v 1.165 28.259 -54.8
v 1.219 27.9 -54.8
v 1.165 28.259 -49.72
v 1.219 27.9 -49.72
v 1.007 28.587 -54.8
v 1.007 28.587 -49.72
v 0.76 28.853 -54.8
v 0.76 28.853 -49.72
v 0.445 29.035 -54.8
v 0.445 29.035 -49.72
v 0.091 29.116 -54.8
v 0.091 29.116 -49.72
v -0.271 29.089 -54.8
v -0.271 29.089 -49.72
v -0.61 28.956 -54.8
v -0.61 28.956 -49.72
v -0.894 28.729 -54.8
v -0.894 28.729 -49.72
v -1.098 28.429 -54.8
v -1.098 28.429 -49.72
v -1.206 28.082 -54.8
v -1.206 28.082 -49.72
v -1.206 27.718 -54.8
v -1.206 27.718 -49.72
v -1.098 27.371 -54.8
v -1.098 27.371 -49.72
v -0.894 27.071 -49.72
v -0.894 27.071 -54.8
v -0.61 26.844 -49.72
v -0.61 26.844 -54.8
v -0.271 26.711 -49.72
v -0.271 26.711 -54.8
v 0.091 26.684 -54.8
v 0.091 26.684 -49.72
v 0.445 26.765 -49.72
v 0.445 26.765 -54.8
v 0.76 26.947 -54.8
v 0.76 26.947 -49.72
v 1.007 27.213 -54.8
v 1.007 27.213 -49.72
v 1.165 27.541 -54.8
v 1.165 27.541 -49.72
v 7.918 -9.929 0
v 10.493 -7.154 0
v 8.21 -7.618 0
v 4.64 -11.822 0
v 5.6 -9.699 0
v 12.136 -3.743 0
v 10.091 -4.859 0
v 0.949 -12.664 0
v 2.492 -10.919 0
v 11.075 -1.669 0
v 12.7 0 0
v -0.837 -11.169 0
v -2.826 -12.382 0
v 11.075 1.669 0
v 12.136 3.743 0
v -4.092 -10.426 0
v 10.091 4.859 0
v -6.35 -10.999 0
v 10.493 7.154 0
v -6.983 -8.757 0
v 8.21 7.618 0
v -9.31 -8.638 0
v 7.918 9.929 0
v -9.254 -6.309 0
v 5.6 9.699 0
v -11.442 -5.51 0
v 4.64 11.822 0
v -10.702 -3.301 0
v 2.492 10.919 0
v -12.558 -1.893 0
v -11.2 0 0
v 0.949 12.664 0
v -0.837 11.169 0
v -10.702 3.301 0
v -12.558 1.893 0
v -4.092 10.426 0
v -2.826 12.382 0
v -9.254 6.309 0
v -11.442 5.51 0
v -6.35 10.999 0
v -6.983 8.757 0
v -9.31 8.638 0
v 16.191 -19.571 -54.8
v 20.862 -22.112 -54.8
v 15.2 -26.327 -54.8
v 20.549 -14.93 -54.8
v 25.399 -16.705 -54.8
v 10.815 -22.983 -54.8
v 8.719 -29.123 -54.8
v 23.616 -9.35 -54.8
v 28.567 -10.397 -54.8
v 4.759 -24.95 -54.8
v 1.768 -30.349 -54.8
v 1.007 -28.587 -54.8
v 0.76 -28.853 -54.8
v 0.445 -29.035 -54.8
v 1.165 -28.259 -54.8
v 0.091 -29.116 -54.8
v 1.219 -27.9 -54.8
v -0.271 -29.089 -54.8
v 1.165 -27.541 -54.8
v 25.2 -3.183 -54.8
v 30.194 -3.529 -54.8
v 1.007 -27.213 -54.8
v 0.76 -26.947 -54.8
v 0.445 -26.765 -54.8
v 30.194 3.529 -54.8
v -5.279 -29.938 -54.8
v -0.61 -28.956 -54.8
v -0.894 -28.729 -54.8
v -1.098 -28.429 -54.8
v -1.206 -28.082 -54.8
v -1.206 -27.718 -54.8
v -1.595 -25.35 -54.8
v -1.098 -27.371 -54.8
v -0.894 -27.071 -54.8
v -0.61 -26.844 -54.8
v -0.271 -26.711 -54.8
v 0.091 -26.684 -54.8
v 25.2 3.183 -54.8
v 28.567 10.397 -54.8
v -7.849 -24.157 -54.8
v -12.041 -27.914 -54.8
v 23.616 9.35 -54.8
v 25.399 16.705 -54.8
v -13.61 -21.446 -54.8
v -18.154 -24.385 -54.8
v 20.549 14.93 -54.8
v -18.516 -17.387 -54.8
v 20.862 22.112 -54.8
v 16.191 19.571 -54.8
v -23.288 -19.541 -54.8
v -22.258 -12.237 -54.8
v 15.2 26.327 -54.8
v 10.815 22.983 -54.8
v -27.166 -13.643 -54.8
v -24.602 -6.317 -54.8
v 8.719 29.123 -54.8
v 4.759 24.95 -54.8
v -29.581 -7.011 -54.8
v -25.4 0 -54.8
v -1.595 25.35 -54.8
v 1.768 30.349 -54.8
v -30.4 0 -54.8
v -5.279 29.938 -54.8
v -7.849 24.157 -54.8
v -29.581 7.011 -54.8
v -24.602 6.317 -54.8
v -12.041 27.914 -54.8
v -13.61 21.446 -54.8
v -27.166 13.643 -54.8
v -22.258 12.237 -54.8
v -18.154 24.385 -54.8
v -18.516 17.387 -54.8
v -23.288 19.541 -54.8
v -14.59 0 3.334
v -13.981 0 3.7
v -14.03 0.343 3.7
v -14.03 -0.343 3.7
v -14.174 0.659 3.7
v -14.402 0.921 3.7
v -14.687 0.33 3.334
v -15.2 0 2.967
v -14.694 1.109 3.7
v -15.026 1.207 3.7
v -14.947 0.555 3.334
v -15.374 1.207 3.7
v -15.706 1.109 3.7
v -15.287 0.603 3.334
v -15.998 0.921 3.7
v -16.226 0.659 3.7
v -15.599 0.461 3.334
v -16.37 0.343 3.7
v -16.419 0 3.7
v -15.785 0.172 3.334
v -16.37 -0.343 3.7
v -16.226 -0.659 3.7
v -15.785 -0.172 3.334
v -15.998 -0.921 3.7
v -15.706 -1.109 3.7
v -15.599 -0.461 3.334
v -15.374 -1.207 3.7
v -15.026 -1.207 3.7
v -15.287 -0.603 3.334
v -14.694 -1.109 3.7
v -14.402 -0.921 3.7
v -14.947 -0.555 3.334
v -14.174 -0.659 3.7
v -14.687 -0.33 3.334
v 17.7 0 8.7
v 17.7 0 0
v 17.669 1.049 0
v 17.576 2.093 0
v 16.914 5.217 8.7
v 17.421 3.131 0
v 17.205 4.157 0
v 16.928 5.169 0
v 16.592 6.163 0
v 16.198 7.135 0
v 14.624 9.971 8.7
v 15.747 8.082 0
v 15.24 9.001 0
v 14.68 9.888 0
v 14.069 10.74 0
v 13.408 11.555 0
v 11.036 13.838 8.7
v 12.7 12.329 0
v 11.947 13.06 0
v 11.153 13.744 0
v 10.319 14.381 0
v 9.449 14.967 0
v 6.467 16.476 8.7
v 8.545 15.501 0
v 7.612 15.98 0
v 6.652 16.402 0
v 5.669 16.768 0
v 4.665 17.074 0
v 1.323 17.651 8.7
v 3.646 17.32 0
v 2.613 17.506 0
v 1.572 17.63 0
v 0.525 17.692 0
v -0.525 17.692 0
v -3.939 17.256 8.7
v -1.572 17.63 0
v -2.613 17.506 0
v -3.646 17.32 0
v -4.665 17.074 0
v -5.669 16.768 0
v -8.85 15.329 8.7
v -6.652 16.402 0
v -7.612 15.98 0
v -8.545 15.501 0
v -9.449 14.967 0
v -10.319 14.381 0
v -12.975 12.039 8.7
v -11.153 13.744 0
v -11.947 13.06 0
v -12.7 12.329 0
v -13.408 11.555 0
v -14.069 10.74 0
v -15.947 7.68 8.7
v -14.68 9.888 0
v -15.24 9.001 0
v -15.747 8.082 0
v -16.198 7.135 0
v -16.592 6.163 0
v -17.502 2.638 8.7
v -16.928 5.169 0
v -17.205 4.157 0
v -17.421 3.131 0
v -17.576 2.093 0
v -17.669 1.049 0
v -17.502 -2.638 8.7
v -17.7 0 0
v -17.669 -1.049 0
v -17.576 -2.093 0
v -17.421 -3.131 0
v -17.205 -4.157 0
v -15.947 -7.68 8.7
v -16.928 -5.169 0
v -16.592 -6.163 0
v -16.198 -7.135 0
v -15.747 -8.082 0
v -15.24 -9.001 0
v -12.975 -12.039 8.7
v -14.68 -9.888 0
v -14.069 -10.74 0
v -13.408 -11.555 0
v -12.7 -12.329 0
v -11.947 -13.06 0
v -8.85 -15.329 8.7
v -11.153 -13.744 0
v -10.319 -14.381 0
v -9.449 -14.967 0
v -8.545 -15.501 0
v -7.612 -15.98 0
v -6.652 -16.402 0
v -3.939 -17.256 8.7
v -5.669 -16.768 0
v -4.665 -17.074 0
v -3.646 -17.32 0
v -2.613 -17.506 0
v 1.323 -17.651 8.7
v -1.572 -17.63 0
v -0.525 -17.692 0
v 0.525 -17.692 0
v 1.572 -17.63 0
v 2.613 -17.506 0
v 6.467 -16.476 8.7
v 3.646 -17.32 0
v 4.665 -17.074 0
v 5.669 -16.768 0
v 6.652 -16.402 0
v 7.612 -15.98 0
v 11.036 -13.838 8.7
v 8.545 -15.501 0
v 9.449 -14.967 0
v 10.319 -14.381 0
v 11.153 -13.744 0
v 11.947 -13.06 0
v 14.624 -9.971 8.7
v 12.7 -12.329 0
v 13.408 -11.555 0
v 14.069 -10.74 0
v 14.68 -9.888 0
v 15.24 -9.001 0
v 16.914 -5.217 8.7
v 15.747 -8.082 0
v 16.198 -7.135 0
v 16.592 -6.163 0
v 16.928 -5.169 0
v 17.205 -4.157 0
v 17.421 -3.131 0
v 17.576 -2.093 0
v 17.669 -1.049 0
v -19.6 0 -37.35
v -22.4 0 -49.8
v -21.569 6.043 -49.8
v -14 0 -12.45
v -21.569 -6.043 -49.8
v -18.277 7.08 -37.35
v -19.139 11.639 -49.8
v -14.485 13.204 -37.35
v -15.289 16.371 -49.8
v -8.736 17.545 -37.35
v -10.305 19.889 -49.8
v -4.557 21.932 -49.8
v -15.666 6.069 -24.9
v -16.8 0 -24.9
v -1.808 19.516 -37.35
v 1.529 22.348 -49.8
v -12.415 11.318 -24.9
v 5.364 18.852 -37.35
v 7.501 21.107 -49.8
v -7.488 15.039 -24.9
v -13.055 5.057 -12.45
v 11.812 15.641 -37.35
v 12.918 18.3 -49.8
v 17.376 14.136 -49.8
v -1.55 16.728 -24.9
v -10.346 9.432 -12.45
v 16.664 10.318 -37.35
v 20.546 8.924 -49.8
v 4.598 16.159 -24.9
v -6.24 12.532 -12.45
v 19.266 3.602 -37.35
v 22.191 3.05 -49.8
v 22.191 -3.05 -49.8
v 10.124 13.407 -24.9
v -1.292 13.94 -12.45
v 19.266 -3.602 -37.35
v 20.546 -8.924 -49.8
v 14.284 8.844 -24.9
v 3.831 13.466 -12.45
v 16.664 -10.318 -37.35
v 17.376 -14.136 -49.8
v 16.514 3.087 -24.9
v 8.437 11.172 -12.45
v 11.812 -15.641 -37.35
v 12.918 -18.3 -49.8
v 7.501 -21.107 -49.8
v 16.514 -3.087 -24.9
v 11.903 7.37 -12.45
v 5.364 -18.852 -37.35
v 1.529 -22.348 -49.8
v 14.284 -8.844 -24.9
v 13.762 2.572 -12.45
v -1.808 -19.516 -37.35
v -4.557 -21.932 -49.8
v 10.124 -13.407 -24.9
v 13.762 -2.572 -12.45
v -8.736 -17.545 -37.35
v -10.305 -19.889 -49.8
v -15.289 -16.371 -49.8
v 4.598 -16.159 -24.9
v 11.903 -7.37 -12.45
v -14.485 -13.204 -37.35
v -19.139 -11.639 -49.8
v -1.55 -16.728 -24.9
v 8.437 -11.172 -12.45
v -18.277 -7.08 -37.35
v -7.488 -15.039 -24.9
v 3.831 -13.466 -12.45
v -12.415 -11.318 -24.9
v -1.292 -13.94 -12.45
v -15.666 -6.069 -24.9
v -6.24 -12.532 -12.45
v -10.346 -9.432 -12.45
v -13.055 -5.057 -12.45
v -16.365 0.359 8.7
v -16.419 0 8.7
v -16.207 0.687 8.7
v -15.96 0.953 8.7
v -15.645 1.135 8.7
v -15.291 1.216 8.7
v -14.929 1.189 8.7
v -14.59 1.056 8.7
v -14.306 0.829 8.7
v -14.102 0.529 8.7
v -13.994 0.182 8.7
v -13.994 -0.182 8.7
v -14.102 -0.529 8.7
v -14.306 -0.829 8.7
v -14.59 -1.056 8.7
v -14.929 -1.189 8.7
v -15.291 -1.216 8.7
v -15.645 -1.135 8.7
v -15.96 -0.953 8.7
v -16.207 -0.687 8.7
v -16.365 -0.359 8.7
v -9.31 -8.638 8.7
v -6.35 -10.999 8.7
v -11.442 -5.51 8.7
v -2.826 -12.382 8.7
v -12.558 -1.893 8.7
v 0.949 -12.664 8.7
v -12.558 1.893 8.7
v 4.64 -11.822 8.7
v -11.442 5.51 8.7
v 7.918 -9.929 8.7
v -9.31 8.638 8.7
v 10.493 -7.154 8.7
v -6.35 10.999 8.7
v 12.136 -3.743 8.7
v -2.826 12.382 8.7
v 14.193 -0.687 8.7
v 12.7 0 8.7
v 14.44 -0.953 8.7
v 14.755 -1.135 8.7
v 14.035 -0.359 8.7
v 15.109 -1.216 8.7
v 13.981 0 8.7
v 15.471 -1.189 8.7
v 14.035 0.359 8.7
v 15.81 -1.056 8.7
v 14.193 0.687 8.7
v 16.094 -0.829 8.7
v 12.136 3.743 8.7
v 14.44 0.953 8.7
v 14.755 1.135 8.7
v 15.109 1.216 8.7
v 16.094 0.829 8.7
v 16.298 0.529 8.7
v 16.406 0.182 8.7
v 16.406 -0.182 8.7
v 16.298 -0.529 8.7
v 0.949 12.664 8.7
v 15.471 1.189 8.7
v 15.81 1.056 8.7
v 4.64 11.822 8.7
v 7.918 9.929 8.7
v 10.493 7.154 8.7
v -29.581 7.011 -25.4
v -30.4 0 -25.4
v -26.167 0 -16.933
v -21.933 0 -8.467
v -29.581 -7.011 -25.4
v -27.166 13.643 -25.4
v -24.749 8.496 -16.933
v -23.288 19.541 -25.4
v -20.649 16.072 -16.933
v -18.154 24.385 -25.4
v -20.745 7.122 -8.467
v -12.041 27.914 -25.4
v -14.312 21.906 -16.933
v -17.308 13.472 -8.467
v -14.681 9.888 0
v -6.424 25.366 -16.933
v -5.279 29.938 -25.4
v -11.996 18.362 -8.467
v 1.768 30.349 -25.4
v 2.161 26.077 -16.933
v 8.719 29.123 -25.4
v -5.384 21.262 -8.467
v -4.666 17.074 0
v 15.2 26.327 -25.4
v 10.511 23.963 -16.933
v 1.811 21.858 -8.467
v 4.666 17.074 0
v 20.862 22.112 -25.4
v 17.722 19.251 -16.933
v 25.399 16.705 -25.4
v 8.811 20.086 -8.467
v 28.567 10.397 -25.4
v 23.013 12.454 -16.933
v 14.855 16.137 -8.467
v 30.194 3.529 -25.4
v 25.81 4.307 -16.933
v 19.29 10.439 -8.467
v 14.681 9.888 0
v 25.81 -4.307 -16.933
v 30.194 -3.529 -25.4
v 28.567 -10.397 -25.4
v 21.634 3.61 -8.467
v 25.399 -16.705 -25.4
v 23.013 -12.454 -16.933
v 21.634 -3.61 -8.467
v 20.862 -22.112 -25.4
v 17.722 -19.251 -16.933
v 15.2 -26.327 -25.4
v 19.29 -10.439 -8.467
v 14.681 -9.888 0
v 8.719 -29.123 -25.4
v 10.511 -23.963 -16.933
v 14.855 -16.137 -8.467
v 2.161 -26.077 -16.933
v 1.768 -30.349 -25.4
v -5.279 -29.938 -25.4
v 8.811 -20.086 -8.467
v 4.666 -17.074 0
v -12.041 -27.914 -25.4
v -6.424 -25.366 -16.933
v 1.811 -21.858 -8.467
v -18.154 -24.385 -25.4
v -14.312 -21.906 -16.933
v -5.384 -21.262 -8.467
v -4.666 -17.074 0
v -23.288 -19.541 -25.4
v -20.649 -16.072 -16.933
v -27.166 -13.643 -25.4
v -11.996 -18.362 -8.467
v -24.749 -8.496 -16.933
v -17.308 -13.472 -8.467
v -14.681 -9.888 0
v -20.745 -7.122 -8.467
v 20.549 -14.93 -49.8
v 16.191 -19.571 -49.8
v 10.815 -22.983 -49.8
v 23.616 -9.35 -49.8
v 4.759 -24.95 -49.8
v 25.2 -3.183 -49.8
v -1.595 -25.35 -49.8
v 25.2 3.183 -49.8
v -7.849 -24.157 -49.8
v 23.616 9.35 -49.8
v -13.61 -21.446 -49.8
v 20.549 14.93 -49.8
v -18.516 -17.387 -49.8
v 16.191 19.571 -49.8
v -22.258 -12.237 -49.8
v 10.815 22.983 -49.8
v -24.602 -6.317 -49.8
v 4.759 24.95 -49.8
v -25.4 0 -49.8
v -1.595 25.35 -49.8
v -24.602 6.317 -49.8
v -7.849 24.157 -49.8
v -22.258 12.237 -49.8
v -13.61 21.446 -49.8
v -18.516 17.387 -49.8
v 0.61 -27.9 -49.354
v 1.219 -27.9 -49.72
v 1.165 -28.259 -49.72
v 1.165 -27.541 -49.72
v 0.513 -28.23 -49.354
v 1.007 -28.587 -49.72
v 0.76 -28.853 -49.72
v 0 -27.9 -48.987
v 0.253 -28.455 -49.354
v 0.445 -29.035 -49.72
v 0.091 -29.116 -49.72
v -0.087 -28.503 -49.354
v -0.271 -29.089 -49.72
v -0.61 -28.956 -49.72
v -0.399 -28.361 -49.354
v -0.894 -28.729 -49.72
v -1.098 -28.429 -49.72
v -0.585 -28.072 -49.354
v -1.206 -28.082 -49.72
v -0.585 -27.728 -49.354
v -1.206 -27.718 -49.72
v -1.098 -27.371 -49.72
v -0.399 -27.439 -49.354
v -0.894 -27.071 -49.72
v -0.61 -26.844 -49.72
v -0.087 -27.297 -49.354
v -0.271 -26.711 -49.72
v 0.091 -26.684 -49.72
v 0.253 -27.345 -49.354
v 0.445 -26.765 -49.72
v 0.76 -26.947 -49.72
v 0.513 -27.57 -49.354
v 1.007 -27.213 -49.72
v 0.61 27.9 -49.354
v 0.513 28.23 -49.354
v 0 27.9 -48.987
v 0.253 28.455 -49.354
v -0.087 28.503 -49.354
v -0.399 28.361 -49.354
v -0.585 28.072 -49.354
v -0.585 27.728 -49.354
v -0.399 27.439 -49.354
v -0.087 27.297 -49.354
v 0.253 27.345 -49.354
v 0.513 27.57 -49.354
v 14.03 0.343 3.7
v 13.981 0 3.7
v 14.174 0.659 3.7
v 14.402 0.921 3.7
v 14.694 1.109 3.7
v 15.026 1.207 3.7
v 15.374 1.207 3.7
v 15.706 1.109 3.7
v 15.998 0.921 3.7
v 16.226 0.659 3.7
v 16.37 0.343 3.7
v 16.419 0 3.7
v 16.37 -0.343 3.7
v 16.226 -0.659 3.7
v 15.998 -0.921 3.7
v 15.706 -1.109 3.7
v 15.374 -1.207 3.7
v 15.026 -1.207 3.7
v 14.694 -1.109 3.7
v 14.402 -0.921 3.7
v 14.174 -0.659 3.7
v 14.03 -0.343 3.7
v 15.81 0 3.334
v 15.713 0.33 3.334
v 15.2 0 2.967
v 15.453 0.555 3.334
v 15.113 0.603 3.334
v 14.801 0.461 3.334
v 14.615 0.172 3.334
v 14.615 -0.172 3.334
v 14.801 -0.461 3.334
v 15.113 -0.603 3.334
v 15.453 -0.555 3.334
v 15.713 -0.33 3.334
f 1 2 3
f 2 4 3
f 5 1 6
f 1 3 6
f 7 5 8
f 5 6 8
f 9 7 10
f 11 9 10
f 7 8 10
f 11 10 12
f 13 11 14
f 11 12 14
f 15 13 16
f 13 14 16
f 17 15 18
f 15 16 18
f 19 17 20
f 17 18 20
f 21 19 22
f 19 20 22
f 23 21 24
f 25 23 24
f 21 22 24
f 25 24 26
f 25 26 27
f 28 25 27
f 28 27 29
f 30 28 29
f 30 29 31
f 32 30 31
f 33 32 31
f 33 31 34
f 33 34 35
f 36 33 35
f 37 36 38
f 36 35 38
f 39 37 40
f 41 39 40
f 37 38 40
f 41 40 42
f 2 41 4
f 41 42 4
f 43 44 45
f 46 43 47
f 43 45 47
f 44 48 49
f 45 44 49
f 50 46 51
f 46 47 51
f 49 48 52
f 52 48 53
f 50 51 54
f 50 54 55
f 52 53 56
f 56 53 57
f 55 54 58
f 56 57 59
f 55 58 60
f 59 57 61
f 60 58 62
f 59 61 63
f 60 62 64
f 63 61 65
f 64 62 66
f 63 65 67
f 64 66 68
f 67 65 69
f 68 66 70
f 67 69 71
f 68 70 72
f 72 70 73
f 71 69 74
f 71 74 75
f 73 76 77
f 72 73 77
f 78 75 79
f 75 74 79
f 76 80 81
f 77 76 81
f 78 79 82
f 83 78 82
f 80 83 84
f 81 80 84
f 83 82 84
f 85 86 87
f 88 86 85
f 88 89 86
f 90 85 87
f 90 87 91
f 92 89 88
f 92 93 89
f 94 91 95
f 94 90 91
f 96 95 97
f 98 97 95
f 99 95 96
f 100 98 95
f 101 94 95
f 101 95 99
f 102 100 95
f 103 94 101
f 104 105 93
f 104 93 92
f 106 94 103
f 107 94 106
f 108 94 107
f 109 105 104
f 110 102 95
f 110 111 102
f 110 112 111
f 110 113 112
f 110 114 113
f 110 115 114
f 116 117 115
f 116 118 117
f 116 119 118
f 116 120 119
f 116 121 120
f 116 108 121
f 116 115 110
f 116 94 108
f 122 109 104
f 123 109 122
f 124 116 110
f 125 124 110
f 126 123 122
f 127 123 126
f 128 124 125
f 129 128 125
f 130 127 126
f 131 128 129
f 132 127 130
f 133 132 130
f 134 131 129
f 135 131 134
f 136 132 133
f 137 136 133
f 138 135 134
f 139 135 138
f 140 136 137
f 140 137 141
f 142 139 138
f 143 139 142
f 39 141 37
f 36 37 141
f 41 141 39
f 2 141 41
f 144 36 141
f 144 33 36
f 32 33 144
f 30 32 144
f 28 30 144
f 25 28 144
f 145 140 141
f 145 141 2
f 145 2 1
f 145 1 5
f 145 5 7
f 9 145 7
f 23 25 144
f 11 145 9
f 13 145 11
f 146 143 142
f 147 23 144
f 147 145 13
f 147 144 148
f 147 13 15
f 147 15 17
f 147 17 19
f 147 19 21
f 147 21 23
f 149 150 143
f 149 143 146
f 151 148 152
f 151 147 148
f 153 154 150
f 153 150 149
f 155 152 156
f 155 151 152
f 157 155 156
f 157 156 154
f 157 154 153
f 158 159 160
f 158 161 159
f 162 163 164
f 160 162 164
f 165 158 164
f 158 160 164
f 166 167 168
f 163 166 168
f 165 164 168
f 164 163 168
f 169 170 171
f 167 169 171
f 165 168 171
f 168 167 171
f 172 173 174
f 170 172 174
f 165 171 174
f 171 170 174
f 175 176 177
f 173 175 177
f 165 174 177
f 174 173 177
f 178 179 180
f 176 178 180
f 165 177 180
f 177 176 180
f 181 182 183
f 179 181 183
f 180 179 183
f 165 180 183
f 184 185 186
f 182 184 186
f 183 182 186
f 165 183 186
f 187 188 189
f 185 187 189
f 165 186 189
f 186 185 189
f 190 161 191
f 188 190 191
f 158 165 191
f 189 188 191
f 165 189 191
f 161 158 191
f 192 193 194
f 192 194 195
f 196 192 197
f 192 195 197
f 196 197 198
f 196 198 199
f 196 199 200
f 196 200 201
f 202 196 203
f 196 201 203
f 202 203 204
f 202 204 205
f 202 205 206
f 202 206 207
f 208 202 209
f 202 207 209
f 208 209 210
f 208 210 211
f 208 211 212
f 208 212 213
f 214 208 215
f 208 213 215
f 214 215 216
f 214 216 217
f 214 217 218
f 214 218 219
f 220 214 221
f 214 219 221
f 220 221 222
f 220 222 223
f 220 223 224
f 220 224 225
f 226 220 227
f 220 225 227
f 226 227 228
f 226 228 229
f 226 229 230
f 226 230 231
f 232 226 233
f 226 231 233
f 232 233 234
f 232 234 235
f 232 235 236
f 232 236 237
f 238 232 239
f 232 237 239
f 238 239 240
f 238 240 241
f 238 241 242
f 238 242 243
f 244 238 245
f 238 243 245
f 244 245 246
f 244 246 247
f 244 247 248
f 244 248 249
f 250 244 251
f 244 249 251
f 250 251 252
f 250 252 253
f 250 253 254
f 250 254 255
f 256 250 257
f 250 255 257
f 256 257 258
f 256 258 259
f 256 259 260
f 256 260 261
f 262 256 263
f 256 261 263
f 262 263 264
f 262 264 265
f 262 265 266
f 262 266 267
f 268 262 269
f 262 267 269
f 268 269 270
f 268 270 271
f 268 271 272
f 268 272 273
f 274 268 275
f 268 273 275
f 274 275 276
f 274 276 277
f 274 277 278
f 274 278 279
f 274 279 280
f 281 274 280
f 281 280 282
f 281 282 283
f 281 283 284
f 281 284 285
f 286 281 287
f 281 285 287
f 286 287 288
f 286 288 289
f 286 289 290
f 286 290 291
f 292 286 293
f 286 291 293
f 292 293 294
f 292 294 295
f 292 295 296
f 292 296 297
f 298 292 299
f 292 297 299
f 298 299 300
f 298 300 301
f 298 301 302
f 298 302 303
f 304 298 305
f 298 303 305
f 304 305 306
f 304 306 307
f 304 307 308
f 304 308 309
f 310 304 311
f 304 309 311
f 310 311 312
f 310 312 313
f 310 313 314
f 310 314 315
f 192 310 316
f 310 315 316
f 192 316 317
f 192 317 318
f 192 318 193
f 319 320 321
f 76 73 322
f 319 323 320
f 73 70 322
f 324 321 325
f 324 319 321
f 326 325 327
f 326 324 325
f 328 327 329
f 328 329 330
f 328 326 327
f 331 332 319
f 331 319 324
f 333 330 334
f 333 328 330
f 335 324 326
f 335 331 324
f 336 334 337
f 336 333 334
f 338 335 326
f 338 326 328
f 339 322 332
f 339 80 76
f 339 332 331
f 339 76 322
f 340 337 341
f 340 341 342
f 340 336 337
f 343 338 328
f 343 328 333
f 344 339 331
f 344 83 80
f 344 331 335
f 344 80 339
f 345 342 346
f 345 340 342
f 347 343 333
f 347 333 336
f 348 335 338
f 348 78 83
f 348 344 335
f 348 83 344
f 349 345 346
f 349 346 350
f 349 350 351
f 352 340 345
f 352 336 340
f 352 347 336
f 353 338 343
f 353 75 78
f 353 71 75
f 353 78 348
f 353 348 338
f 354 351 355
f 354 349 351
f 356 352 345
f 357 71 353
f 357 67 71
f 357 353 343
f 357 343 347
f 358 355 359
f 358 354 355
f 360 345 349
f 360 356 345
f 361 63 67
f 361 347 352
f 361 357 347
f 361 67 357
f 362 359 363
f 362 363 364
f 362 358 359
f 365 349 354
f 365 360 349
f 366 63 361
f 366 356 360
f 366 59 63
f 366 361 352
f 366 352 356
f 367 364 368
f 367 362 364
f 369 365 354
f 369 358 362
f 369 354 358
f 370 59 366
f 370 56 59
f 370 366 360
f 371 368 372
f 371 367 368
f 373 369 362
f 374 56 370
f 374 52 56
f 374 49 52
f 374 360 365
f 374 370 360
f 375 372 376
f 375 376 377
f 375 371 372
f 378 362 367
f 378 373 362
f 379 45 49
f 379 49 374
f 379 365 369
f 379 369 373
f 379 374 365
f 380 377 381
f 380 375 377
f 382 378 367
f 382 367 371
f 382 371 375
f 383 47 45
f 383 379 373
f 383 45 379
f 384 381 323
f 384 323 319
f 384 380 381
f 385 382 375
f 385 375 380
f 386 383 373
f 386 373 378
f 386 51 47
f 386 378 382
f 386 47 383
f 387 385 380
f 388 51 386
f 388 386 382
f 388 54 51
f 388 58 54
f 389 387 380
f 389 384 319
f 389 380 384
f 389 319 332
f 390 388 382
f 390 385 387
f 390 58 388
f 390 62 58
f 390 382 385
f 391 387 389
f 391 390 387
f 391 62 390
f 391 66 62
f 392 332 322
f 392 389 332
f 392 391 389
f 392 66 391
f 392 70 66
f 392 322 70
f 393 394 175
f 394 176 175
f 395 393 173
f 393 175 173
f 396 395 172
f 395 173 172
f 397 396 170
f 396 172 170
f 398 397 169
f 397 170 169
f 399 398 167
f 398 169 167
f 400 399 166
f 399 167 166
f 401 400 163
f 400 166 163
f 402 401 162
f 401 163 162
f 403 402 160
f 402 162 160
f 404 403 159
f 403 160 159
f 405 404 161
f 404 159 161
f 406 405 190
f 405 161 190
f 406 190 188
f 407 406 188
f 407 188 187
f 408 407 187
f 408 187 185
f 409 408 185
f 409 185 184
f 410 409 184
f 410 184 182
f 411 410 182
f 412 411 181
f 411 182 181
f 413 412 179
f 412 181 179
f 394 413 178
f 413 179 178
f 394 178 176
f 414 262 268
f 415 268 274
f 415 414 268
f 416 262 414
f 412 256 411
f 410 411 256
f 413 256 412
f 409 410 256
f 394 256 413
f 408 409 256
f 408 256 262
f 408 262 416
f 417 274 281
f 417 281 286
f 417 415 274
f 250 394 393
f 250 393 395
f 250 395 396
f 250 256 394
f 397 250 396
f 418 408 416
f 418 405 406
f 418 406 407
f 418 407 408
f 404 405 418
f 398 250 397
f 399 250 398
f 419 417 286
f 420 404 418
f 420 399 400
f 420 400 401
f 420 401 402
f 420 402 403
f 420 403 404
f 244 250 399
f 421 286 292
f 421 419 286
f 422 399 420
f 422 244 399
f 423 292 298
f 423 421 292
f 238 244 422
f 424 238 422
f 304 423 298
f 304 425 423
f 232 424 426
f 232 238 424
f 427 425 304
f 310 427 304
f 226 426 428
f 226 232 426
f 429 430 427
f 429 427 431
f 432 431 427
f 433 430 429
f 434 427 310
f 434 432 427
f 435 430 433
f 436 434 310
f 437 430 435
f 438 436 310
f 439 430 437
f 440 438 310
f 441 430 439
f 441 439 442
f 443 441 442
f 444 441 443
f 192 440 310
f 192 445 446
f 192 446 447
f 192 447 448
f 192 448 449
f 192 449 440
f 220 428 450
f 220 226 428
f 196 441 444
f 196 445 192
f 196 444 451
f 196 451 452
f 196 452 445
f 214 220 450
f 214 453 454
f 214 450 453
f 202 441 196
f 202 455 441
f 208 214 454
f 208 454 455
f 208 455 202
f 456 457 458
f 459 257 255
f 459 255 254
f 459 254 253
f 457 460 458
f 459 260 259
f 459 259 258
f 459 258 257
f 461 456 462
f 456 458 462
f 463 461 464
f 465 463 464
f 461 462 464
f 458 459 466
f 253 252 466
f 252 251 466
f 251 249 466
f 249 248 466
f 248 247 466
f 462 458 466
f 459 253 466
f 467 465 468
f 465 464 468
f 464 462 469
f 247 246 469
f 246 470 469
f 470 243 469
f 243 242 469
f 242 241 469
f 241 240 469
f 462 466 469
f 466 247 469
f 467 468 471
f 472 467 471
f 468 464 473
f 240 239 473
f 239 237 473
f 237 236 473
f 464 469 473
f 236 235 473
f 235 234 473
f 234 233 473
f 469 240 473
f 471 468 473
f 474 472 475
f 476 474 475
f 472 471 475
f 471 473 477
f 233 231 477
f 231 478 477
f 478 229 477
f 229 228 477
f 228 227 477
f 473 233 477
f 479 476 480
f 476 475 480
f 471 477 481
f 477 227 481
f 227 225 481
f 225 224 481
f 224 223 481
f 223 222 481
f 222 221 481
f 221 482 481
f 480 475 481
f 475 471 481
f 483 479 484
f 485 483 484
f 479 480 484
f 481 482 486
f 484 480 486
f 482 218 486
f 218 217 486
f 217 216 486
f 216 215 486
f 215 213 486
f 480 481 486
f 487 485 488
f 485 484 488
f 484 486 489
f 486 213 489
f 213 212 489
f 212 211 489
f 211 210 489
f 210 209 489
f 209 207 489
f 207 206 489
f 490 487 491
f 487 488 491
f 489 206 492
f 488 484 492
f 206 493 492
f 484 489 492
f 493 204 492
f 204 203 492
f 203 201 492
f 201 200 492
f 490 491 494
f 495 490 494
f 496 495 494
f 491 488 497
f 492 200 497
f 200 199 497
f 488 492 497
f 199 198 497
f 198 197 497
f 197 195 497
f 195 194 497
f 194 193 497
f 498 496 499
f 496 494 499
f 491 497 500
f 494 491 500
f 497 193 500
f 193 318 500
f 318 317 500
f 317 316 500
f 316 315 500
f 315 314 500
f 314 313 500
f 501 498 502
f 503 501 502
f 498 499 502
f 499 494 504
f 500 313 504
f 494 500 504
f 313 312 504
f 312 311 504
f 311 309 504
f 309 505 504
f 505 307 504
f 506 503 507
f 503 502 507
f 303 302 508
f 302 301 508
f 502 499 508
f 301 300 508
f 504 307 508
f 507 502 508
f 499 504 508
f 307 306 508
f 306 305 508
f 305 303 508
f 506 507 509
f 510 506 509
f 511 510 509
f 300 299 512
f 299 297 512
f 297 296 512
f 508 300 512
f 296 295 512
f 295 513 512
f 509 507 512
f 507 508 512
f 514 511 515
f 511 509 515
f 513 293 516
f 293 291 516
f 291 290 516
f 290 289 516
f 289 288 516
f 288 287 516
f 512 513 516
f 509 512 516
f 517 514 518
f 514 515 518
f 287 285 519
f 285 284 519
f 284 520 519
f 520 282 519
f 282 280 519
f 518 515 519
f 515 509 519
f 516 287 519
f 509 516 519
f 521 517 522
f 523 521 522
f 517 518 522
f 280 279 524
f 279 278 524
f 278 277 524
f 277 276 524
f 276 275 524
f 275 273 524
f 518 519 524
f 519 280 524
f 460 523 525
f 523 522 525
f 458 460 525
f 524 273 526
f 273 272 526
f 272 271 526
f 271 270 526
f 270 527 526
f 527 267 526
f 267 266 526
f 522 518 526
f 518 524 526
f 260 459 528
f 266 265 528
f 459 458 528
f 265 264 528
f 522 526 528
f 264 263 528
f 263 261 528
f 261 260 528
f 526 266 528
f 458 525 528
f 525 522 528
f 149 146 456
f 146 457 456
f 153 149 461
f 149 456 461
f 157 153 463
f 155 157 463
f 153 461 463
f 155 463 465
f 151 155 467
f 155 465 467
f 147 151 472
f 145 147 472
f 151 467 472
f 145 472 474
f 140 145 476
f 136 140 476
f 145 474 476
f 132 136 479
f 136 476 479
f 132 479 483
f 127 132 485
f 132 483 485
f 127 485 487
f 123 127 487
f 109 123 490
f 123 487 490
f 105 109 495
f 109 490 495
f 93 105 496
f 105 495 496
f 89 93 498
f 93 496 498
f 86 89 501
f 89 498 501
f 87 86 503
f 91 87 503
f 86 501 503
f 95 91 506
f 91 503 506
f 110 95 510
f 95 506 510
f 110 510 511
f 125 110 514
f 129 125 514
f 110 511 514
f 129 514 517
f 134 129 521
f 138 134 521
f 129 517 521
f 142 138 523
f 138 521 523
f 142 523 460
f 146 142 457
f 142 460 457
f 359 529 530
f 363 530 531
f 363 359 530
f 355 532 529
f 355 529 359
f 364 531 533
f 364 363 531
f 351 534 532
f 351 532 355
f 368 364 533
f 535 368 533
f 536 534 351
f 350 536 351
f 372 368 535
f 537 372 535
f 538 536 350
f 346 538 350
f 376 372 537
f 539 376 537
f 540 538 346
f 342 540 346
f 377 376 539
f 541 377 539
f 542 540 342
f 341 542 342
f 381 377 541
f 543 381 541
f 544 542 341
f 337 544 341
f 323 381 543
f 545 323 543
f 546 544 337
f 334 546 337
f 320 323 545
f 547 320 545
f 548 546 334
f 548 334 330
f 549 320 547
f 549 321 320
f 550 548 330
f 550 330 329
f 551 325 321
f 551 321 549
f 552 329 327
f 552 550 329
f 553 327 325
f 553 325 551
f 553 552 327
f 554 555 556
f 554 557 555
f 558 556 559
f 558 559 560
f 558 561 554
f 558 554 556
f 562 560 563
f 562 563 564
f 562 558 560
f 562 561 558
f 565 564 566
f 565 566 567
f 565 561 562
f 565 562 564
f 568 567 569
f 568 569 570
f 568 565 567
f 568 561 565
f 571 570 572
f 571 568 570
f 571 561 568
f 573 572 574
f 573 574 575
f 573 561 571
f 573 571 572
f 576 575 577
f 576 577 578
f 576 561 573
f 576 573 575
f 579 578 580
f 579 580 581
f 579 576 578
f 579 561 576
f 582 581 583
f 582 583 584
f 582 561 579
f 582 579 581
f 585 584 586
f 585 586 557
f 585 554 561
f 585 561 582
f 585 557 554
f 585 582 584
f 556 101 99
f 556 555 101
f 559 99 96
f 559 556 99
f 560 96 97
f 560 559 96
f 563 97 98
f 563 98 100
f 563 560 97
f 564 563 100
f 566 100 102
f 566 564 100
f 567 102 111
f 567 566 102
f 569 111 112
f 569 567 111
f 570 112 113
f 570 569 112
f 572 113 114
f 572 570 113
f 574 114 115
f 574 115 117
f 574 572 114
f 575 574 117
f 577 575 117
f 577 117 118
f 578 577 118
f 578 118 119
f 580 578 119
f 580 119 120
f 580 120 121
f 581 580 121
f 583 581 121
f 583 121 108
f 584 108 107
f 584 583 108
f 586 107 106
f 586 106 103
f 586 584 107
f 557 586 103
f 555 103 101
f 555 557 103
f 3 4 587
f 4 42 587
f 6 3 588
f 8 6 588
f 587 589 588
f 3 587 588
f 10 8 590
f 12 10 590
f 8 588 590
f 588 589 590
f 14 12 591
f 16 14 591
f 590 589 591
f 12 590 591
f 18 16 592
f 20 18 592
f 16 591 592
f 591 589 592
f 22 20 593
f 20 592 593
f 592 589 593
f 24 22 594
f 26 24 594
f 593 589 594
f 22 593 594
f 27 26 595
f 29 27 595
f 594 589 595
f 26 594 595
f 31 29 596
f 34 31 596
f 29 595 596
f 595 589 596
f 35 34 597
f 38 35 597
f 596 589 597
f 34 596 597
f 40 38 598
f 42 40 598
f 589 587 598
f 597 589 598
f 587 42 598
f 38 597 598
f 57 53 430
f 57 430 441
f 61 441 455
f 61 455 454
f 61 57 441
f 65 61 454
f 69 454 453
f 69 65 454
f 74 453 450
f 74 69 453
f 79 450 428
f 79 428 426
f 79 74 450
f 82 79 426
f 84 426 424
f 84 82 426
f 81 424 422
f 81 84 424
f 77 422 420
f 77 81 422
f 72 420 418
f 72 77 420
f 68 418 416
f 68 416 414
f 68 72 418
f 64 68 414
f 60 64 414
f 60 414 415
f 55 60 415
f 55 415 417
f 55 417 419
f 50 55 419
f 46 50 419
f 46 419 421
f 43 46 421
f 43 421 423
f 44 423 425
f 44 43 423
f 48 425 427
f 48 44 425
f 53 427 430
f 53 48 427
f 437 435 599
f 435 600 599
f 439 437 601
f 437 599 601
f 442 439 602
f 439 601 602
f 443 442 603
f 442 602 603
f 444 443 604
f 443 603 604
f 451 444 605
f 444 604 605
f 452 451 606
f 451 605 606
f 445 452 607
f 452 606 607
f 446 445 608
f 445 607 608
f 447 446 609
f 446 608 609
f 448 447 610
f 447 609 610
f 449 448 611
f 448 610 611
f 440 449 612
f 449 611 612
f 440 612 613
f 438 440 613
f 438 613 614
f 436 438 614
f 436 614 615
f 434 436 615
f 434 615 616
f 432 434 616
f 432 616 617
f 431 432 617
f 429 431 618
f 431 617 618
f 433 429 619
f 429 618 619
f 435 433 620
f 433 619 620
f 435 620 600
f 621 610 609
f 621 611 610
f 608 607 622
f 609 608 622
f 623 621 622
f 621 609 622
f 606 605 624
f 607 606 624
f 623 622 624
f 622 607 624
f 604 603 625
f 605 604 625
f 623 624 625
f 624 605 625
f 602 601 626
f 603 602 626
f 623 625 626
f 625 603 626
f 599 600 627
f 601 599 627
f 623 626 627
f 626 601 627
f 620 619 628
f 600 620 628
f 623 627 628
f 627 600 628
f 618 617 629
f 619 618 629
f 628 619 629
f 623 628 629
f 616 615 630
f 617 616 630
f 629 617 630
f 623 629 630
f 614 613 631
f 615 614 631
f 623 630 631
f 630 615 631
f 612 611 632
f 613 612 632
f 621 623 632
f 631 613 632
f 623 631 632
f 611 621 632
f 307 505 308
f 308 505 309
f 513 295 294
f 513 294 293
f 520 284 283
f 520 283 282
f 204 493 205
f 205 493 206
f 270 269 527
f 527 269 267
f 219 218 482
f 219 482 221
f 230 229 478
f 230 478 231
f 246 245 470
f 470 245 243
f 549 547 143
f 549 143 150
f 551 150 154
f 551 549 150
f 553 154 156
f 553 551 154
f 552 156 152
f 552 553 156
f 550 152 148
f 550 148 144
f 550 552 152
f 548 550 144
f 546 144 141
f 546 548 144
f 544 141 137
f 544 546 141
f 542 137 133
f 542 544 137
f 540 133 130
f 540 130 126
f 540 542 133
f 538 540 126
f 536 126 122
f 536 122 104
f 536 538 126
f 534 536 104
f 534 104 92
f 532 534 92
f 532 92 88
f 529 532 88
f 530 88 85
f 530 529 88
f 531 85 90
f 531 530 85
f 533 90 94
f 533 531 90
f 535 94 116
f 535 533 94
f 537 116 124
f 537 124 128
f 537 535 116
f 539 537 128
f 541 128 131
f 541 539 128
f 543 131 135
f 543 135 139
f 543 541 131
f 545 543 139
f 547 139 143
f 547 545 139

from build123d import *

# Parameters (mm, degrees)
ESQUISSE1_R                     = 17.7
ESQUISSE1_R_2                   = 12.7
BOSS_EXTRU_1_DEPTH              = 8.7
ESQUISSE2_R                     = 30.4
ESQUISSE2_R_2                   = 11.2
BOSS_EXTRU_2_DEPTH              = 49.8
CHANFREIN1_SIZE                 = 25.4
CHANFREIN1_SIZE2                = 12.699971641
CHANFREIN3_SIZE                 = 11.200084029
CHANFREIN3_SIZE_2               = 49.8
F_41_0_096_DIAMETER_HOLE1_D     = 2.4384
F_41_0_096_DIAMETER_HOLE1_DEPTH = 5
F_41_0_096_DIAMETER_HOLE1_TIP   = 0.732569267
SKETCH5_R                       = 30.4
SKETCH5_R_2                     = 25.4
BOSS_EXTRUDE1_DEPTH             = 5


# Read off the part's stored shape, not the designer's step: AdvancedHole1
with BuildPart() as part:
    # Esquisse1 → Boss.-Extru.1 (new body)
    with BuildSketch(Plane.XY):
        Circle(ESQUISSE1_R)
        Circle(ESQUISSE1_R_2, mode=Mode.SUBTRACT)
    extrude(amount=BOSS_EXTRU_1_DEPTH)

    # Esquisse2 → Boss.-Extru.2 (add)
    with BuildSketch(Plane(origin=(0, 0, 0), x_dir=(-1, 0, 0), z_dir=(0, 0, -1))):
        Circle(ESQUISSE2_R)
        Circle(ESQUISSE2_R_2, mode=Mode.SUBTRACT)
    extrude(amount=BOSS_EXTRU_2_DEPTH)

    # Chanfrein1
    chanfrein1_edges = [part.edges().sort_by_distance(p)[0] for p in [
        (30.4, 0, 0),
    ]]
    chanfrein1_side = [part.faces().sort_by_distance(p)[0] for p in [
        (30.4, 0, -24.9),
    ]]
    chamfer(chanfrein1_edges, length=CHANFREIN1_SIZE, length2=CHANFREIN1_SIZE2, reference=chanfrein1_side[0])

    # Chanfrein3
    # the kernel refuses this chamfer: 49.8, 11.200084029 mm, written as the material it takes off along each edge
    with BuildSketch(Plane(origin=(0, 0, -49.8), x_dir=(-1, 0, 0), z_dir=(0, -1, 0))) as chanfrein3_piece_1:
        Polygon((11.2 + CHANFREIN3_SIZE, 0), (11.2, -CHANFREIN3_SIZE_2), (11.2, 0), align=None)
    revolve(axis=Axis((0, 0, -49.8), (0, 0, -1)), mode=Mode.SUBTRACT)

    # #41 (0.096) Diameter Hole1
    with Locations(Plane.XY.offset(8.7)):
        with Locations((-15.2, 0), (15.2, 0)):
            Hole(F_41_0_096_DIAMETER_HOLE1_D / 2, depth=F_41_0_096_DIAMETER_HOLE1_DEPTH)
            with Locations((0, 0, -(F_41_0_096_DIAMETER_HOLE1_DEPTH + F_41_0_096_DIAMETER_HOLE1_TIP / 2))):  # 118° drill point
                Cone(0, F_41_0_096_DIAMETER_HOLE1_D / 2, F_41_0_096_DIAMETER_HOLE1_TIP, mode=Mode.SUBTRACT)

    # Sketch5 → Boss-Extrude1 (add)
    with BuildSketch(Plane(origin=(0, 0, -49.8), x_dir=(-1, 0, 0), z_dir=(0, 0, -1))):
        Circle(SKETCH5_R)
        Circle(SKETCH5_R_2, mode=Mode.SUBTRACT)
    extrude(amount=BOSS_EXTRUDE1_DEPTH)

    # AdvancedHole1 outline → AdvancedHole1 (revolve, cut)
    with BuildSketch(Plane.XZ.offset(-27.9)):
        Polygon((1.2192, -54.8), (1.2192, -49.72), (0, -48.987430733), (0, -54.8), align=None)
    advancedhole1 = revolve(axis=Axis((0, 27.9, 0), (0, 0, 1)), mode=Mode.SUBTRACT)

    # Mirror1: AdvancedHole1 across plane
    add(advancedhole1.mirror(Plane.ZX), mode=Mode.SUBTRACT)


solid = part.part
